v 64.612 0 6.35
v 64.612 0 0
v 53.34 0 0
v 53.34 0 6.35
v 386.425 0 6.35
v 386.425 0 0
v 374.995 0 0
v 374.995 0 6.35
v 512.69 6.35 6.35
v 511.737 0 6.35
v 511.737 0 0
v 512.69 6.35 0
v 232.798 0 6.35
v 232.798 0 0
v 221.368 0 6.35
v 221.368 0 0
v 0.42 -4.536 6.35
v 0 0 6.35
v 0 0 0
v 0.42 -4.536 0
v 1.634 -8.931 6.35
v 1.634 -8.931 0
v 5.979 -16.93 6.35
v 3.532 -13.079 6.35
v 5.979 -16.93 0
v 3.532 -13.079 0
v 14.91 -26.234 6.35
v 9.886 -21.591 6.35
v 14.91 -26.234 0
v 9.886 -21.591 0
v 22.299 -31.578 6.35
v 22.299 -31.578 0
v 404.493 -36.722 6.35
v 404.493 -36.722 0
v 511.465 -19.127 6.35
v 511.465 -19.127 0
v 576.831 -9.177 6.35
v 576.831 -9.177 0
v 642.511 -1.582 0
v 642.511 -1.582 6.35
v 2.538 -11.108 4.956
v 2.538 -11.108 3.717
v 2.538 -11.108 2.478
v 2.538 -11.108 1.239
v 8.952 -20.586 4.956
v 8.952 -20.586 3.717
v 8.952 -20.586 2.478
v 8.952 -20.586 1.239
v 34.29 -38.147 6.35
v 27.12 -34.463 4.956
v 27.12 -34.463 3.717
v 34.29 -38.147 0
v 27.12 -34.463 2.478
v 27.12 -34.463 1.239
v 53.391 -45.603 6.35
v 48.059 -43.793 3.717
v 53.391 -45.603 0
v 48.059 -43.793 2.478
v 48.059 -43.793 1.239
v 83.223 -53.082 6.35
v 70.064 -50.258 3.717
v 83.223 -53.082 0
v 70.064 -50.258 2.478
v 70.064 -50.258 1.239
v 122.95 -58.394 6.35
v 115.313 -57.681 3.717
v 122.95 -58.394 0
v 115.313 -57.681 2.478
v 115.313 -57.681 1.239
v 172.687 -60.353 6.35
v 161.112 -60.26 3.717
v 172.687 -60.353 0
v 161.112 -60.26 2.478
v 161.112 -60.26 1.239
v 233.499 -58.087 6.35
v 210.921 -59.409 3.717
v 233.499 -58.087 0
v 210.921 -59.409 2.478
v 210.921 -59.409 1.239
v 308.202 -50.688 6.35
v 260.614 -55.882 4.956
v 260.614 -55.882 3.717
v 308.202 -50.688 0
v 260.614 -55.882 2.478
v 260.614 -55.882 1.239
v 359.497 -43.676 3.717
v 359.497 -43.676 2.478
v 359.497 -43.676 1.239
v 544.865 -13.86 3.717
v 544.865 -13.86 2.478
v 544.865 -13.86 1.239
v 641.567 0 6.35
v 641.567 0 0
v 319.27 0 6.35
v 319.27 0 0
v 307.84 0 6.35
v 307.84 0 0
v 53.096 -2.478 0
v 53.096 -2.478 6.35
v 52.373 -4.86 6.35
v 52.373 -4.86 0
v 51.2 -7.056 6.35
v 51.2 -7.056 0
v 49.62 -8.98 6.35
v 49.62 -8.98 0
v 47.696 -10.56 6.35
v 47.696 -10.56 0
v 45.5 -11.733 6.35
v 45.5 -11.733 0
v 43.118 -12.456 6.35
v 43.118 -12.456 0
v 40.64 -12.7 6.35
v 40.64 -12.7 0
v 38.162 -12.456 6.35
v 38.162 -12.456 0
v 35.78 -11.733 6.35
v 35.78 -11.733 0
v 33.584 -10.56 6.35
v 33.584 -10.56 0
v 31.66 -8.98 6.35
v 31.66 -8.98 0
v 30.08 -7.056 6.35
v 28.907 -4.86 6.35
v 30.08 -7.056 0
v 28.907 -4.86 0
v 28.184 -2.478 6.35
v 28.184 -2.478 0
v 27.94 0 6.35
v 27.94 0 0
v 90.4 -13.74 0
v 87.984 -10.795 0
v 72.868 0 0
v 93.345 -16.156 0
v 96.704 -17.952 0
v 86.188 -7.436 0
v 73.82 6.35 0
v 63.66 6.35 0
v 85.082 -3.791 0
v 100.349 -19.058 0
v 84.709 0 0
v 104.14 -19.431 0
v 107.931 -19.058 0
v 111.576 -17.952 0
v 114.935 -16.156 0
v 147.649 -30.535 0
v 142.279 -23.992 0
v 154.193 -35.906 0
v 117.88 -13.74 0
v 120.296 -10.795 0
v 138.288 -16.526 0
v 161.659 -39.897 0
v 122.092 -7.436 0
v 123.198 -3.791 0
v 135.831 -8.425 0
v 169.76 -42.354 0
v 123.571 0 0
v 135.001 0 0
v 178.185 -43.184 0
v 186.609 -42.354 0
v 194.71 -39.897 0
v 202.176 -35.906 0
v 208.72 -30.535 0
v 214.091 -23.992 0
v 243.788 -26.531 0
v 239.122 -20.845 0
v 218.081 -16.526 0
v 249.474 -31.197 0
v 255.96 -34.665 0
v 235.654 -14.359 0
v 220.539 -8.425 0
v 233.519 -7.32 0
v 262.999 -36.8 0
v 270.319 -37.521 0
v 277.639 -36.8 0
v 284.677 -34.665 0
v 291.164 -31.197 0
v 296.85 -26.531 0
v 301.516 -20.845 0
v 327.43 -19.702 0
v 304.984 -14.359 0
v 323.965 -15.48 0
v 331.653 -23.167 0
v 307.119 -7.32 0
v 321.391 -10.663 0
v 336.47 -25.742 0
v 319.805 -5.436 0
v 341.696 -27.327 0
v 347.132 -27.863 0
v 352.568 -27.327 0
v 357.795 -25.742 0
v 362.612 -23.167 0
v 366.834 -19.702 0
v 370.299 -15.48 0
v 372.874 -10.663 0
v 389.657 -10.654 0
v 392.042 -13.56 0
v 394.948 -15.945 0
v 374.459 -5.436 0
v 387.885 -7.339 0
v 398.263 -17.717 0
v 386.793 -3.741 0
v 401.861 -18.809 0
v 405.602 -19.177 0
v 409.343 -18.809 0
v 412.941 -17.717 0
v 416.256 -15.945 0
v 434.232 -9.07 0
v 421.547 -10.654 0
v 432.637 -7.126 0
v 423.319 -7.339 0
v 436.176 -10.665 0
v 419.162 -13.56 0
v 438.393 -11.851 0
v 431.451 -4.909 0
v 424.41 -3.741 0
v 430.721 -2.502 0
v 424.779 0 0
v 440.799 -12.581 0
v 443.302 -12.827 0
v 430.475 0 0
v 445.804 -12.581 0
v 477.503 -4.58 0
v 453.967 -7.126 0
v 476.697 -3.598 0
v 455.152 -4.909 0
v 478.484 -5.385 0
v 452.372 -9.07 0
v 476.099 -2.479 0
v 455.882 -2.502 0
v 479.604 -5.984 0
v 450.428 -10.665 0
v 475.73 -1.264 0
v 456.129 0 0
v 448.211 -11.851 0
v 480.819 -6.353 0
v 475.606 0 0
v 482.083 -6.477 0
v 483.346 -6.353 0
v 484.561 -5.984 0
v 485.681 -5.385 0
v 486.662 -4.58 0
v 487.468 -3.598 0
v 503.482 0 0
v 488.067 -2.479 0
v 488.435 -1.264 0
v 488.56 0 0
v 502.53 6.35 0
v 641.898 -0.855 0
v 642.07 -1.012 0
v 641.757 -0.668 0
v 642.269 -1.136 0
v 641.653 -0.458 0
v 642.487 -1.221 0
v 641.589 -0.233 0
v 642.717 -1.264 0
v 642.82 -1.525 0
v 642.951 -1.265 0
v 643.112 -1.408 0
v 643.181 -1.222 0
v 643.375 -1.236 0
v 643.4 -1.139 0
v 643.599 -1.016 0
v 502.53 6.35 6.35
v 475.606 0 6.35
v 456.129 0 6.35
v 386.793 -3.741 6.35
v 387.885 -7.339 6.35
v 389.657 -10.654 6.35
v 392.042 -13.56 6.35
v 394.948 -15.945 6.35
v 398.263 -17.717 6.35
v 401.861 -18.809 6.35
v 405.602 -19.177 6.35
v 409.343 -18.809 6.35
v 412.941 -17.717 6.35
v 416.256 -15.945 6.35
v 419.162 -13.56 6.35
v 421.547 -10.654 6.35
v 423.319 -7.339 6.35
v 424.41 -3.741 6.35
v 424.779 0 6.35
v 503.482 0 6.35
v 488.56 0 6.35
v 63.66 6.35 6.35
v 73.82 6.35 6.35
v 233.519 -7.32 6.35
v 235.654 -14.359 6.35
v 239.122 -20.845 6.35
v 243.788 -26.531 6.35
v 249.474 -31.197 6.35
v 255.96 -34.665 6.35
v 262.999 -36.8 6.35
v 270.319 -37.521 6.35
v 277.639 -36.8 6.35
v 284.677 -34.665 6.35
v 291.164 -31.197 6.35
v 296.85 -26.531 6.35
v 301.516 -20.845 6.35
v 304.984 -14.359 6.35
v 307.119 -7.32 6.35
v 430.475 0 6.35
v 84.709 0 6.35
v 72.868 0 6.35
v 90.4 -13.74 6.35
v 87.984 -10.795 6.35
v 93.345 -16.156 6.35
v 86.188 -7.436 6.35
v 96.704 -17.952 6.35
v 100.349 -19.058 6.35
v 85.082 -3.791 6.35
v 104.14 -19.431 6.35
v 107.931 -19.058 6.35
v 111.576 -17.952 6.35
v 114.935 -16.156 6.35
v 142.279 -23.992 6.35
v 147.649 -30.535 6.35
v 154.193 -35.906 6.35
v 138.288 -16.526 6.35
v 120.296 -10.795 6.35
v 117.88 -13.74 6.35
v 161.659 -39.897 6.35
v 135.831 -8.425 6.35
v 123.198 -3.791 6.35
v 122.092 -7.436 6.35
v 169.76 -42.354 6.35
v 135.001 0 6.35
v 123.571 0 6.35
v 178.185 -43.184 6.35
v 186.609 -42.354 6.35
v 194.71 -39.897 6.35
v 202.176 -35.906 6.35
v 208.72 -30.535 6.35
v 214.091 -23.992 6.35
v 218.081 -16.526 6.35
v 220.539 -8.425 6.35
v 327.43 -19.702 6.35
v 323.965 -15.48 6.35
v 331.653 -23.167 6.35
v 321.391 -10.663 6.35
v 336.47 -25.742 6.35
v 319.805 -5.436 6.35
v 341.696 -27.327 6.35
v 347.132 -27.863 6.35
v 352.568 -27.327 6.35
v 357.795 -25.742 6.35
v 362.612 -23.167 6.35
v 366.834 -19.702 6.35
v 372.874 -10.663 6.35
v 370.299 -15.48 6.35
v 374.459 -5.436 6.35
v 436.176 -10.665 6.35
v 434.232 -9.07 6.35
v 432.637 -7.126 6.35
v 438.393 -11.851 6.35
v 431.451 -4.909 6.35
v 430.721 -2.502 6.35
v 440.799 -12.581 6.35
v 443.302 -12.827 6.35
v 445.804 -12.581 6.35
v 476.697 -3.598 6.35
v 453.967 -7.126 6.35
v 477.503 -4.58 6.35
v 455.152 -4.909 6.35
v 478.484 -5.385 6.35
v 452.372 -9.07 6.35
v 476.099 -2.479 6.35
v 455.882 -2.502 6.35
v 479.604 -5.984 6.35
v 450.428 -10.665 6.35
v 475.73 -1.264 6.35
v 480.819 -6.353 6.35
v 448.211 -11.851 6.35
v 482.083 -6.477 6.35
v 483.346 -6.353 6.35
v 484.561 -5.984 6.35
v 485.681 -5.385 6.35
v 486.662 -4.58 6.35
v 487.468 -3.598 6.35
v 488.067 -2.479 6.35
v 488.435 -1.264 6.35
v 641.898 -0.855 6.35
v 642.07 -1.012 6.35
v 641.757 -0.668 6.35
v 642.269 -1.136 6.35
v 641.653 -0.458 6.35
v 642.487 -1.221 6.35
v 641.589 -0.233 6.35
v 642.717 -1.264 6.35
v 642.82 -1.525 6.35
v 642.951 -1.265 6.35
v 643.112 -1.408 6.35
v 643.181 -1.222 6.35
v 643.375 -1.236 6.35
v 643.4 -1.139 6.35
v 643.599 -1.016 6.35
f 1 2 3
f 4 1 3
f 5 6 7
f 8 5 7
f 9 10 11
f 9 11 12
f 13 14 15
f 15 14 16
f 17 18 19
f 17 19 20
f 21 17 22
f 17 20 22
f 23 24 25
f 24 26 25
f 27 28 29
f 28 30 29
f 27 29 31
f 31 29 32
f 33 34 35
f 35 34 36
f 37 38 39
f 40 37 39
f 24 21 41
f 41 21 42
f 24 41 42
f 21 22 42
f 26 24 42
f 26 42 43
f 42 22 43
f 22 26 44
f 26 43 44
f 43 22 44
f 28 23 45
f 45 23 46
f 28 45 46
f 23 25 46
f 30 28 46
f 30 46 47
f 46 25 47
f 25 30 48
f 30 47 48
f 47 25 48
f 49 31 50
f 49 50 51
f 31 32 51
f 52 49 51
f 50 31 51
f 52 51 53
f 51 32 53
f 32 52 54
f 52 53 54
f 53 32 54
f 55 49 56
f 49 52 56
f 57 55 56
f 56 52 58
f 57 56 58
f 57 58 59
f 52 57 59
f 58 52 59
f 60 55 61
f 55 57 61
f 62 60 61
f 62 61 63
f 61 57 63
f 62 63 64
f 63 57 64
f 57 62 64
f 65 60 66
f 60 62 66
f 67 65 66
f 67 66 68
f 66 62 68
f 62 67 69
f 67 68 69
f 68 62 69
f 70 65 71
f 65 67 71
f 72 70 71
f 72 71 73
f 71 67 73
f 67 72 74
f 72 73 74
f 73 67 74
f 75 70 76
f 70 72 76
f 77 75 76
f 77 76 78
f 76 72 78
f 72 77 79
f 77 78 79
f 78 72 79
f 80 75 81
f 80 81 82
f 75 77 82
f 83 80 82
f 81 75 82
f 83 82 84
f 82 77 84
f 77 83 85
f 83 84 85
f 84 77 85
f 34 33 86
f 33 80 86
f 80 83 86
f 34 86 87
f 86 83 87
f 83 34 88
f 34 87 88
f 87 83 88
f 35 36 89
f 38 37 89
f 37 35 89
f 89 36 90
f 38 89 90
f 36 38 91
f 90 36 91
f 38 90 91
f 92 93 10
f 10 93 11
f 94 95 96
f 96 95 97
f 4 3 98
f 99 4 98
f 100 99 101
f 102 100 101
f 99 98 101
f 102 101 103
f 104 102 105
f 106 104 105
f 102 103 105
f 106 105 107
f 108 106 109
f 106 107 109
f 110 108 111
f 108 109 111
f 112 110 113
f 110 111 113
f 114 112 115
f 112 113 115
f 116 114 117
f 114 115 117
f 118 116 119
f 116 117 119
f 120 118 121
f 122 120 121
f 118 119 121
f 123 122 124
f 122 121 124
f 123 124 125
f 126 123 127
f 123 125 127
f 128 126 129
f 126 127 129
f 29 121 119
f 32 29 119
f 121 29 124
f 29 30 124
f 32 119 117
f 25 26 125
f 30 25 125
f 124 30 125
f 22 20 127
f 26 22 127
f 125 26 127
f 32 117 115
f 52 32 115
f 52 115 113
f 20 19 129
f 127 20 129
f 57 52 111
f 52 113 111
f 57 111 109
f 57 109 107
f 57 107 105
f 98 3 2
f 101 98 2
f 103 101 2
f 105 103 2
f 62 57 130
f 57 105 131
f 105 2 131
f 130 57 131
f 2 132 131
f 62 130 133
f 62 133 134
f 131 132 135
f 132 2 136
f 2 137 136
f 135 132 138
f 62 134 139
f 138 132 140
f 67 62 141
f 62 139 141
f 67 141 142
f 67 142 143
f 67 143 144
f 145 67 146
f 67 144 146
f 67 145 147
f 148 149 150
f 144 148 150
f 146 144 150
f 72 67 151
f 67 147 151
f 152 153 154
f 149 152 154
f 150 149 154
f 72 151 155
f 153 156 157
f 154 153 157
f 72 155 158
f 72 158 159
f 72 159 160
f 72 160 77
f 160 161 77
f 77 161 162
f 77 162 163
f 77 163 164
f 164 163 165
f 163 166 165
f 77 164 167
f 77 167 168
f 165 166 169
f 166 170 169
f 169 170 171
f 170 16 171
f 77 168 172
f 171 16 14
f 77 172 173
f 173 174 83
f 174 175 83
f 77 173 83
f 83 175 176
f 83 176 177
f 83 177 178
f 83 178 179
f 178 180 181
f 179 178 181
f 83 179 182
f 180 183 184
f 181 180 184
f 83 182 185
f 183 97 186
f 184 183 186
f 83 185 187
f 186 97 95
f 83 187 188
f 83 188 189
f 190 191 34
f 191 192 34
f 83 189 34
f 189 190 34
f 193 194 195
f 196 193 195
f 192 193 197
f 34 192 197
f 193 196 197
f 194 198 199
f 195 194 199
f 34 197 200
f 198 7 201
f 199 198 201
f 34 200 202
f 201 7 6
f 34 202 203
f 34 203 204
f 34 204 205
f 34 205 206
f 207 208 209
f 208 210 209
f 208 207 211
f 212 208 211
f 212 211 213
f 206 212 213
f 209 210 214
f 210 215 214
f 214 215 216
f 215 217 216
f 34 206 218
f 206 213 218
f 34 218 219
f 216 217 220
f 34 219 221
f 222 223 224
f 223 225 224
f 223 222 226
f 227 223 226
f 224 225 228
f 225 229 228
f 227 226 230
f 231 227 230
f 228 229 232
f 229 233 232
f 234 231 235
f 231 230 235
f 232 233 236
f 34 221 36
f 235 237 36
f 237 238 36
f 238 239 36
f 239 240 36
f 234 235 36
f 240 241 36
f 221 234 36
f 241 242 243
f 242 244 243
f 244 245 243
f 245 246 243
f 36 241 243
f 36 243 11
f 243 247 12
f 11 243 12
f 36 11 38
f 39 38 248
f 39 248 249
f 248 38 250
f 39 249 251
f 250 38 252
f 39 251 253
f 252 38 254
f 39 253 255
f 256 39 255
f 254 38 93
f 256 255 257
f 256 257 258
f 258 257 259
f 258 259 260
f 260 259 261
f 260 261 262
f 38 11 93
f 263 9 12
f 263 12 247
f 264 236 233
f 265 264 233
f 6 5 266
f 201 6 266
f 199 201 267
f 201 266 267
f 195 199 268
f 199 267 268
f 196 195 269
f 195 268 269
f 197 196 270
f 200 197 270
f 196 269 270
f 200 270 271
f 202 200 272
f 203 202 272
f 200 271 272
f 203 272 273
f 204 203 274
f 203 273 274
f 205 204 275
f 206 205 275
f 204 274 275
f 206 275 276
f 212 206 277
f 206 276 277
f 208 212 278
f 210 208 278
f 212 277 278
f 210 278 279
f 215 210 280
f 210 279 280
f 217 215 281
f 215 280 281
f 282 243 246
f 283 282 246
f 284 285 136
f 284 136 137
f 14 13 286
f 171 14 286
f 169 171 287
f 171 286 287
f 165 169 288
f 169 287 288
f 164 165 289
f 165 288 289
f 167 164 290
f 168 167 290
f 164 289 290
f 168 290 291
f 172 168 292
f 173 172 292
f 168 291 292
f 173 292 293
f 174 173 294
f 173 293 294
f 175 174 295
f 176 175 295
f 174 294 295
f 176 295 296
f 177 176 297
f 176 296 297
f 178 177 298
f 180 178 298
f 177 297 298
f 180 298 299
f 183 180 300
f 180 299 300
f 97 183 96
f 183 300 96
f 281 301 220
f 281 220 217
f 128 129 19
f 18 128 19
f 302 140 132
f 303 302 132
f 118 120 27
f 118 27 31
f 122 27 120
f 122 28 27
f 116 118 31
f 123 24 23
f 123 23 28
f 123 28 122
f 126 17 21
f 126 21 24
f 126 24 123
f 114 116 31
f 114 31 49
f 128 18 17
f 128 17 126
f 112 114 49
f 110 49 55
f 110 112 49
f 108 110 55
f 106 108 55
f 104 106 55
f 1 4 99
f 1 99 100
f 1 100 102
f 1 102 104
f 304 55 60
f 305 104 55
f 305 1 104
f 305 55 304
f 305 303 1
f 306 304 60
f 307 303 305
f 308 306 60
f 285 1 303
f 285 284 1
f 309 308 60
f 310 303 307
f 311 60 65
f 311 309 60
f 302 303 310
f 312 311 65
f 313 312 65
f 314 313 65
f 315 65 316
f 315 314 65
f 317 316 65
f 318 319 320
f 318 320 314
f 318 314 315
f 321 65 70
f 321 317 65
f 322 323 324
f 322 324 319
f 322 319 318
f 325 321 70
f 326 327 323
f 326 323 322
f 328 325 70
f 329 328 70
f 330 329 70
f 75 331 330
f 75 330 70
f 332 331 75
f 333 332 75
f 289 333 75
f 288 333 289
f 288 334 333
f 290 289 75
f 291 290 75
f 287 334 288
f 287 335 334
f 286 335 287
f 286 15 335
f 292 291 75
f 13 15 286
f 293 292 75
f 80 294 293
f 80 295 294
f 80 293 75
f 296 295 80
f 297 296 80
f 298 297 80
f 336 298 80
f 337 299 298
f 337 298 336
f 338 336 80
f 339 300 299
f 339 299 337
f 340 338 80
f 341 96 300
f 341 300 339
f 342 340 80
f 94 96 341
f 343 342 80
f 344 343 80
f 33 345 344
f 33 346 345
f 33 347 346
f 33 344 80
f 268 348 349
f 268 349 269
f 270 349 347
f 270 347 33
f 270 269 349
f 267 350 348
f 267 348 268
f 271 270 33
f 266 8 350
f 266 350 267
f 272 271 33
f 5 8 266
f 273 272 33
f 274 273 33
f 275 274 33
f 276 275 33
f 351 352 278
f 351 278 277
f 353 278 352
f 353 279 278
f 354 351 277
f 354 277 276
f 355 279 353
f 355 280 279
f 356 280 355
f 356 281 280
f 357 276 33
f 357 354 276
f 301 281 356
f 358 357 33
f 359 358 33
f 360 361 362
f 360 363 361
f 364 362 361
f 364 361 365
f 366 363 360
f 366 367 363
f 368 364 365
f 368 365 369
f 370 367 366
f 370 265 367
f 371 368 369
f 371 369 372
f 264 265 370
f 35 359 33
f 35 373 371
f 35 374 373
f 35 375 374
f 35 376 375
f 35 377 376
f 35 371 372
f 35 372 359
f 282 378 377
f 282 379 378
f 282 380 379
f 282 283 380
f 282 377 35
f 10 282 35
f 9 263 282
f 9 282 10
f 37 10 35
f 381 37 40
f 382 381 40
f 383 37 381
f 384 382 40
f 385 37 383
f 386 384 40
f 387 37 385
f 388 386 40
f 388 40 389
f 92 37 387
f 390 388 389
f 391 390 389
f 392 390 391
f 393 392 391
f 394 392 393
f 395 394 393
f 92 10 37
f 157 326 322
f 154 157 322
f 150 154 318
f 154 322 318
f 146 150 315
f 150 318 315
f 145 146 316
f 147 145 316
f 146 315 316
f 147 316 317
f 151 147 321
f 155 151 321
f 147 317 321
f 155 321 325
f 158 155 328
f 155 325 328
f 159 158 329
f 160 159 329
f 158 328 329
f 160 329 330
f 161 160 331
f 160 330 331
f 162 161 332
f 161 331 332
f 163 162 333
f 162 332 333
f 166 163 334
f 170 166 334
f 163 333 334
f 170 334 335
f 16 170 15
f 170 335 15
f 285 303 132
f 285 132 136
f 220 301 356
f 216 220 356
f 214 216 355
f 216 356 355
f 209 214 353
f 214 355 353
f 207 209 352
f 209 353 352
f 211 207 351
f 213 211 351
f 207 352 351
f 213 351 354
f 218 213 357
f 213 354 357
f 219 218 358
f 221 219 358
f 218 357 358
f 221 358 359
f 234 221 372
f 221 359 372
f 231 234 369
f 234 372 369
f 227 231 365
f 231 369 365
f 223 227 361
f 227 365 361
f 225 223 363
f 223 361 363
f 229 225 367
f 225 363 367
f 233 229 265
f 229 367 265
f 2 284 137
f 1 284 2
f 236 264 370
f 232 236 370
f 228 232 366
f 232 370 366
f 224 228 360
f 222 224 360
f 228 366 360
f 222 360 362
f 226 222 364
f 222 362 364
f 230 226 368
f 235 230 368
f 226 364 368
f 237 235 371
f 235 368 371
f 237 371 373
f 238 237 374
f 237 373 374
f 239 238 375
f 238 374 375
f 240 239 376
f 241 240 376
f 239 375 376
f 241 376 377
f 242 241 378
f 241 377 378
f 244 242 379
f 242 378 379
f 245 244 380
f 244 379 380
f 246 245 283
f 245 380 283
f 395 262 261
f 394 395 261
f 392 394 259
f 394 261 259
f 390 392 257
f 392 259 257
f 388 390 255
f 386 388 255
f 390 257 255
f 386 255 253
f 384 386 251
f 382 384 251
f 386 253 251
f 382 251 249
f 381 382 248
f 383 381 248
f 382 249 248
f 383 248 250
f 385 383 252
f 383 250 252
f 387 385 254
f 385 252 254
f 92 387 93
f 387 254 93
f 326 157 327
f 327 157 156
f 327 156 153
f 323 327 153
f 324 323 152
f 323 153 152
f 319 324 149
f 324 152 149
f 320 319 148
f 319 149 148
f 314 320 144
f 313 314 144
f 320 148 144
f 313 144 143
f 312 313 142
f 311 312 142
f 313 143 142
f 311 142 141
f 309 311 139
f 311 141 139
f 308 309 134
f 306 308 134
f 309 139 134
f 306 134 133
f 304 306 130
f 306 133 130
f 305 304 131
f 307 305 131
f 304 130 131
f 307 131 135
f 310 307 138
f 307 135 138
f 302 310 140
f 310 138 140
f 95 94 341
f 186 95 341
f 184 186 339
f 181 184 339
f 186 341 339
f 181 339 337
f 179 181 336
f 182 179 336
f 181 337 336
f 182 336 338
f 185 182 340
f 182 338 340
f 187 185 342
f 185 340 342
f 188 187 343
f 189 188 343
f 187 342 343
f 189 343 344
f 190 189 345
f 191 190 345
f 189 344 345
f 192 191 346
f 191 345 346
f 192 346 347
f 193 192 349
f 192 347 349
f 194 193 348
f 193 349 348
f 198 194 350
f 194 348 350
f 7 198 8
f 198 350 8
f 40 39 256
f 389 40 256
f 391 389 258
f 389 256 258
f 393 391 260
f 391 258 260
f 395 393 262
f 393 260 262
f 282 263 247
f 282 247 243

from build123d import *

# Parameters (mm, degrees)
BOSS_EXTRUDE1_DEPTH     = 6.35
CUT_EXTRUDE2_DEPTH      = 1.0000001
CUT_EXTRUDE2_DEPTH_BACK = 7.3500001
SKETCH4_W               = 6.35
SKETCH4_H               = 6.35
BOSS_EXTRUDE2_DEPTH     = 6.35


with BuildPart() as part:
    # Sketch2 → Boss-Extrude1 (new body)
    with BuildSketch(Plane.XY):
        with BuildLine():
            ThreePointArc((642.510849283, -1.582039112), (643.111845681, -1.408373102), (643.599082689, -1.016))
            ThreePointArc((643.599082689, -1.016), (642.269121423, -1.135922533), (641.567082689, 0))
            Line((641.567082689, 0), (473.360965279, 0))
            Line((473.360965279, 0), (460.660965279, 0))
            Line((460.660965279, 0), (123.571, 0))
            ThreePointArc((123.571, 0), (104.14, -19.431), (84.709, 0))
            Line((84.709, 0), (53.34, 0))
            ThreePointArc((53.34, 0), (40.64, -12.7), (27.94, 0))
            Line((27.94, 0), (0, 0))
            add(Edge.make_bspline(
                [(0, 0), (0, -1.007496172), (0.154611582, -3.513796615), (1.106333228, -7.923389435), (3.463136343, -13.420354421), (7.689616489, -19.513207632), (13.932423524, -25.726412106), (22.129107375, -31.731455339), (32.141645239, -37.332204029), (43.82045433, -42.41500246), (57.023709725, -46.912543066), (71.619696083, -50.784752003), (87.485018636, -54.008935199), (104.502313427, -56.574303932), (122.558104573, -58.481758104), (141.542033828, -59.739895824), (161.345829027, -60.366961324), (181.863132616, -60.387506142), (202.989192599, -59.8341217), (224.620860897, -58.745176641), (246.65655865, -57.164603829), (268.996310773, -55.141201012), (291.541767704, -52.727712704), (314.196207315, -49.979843895), (336.86454415, -46.955447457), (359.453314895, -43.713502532), (381.870662856, -40.313266856), (404.02631566, -36.813220545), (425.831595832, -33.270324121), (447.199424328, -29.739007432), (468.044367735, -26.27043606), (488.282710288, -22.911672601), (507.832591566, -19.705111663), (526.614143658, -16.687720753), (544.549749946, -13.890665375), (561.564270734, -11.338919625), (577.585454095, -9.050636147), (592.543922516, -7.037634907), (606.374988512, -5.304428983), (619.014124193, -3.849253664), (630.413817462, -2.663385493), (638.093728429, -1.953546407), (641.993392355, -1.625070631), (642.510849283, -1.582039112)],
                knots=[0.5, 0.5, 0.5, 0.5, 0.502166769, 0.505390167, 0.509655974, 0.514947682, 0.521244711, 0.528520886, 0.536744945, 0.54588136, 0.555890751, 0.566730119, 0.57835299, 0.590709588, 0.603747039, 0.617409572, 0.631638768, 0.646373793, 0.661551658, 0.677107483, 0.692974771, 0.709085713, 0.725371443, 0.741762353, 0.758188398, 0.774579367, 0.790865214, 0.806976332, 0.822843867, 0.838400002, 0.853578262, 0.868313774, 0.882543568, 0.896206835, 0.909245173, 0.92160287, 0.933227116, 0.944068236, 0.954079898, 0.963219316, 0.971447445, 0.978729112, 0.979842958, 0.979842958, 0.979842958, 0.979842958], degree=3))
        make_face()
    extrude(amount=BOSS_EXTRUDE1_DEPTH)

    # Sketch3 → Cut-Extrude2 (cut, two sides)
    with BuildSketch(Plane.XY.offset(6.35)) as cut_extrude2_sk:
        with BuildLine():
            ThreePointArc((221.368346157, 0), (178.184673078, 43.183673078), (135.001, 0))
            Line((135.001, 0), (221.368346157, 0))
        make_face()
        with BuildLine():
            Line((221.368346157, 0), (135.001, 0))
            ThreePointArc((135.001, 0), (178.184673078, -43.183673078), (221.368346157, 0))
        make_face()
        with BuildLine():
            ThreePointArc((307.839599131, 0), (270.318972644, 37.520626487), (232.798346157, 0))
            Line((232.798346157, 0), (307.839599131, 0))
        make_face()
        with BuildLine():
            Line((307.839599131, 0), (232.798346157, 0))
            ThreePointArc((232.798346157, 0), (270.318972644, -37.520626487), (307.839599131, 0))
        make_face()
        with BuildLine():
            ThreePointArc((374.99479385, 0), (347.13219649, 27.862597359), (319.269599131, 0))
            Line((319.269599131, 0), (374.99479385, 0))
        make_face()
        with BuildLine():
            Line((374.99479385, 0), (319.269599131, 0))
            ThreePointArc((319.269599131, 0), (347.13219649, -27.862597359), (374.99479385, 0))
        make_face()
        with BuildLine():
            ThreePointArc((424.77879385, 0), (405.60179385, 19.177), (386.42479385, 0))
            Line((386.42479385, 0), (424.77879385, 0))
        make_face()
        with BuildLine():
            Line((424.77879385, 0), (386.42479385, 0))
            ThreePointArc((386.42479385, 0), (405.60179385, -19.177), (424.77879385, 0))
        make_face()
        with BuildLine():
            ThreePointArc((430.474866123, 0), (443.301866123, -12.827), (456.128866123, 0))
            Line((456.128866123, 0), (430.474866123, 0))
        make_face()
        with BuildLine():
            Line((430.474866123, 0), (456.128866123, 0))
            ThreePointArc((456.128866123, 0), (443.301866123, 12.827), (430.474866123, 0))
        make_face()
        with BuildLine():
            ThreePointArc((475.605534569, 0), (482.082534569, -6.477), (488.559534569, 0))
            Line((488.559534569, 0), (475.605534569, 0))
        make_face()
        with BuildLine():
            Line((475.605534569, 0), (488.559534569, 0))
            ThreePointArc((488.559534569, 0), (482.082534569, 6.477), (475.605534569, 0))
        make_face()
    extrude(amount=CUT_EXTRUDE2_DEPTH, mode=Mode.SUBTRACT)
    extrude(cut_extrude2_sk.sketch, amount=-CUT_EXTRUDE2_DEPTH_BACK, mode=Mode.SUBTRACT)

    # Sketch4 → Boss-Extrude2 (add)
    with BuildSketch(Plane.XY.offset(6.35)):
        Polygon((503.482034569, 0), (504.434534569, 0), (504.434534569, 6.35), (502.529534569, 6.35), align=None)
        with Locations((507.609534569, 3.175)):
            Rectangle(SKETCH4_W, SKETCH4_H)
        Polygon((510.784534569, 0), (511.737034569, 0), (512.689534569, 6.35), (510.784534569, 6.35), align=None)
        Polygon((65.565, 6.35), (63.66, 6.35), (64.6125, 0), (65.565, 0), align=None)
        with Locations((68.74, 3.175)):
            Rectangle(SKETCH4_W, SKETCH4_H)
        Polygon((73.82, 6.35), (71.915, 6.35), (71.915, 0), (72.8675, 0), align=None)
    extrude(amount=-BOSS_EXTRUDE2_DEPTH)


solid = part.part
